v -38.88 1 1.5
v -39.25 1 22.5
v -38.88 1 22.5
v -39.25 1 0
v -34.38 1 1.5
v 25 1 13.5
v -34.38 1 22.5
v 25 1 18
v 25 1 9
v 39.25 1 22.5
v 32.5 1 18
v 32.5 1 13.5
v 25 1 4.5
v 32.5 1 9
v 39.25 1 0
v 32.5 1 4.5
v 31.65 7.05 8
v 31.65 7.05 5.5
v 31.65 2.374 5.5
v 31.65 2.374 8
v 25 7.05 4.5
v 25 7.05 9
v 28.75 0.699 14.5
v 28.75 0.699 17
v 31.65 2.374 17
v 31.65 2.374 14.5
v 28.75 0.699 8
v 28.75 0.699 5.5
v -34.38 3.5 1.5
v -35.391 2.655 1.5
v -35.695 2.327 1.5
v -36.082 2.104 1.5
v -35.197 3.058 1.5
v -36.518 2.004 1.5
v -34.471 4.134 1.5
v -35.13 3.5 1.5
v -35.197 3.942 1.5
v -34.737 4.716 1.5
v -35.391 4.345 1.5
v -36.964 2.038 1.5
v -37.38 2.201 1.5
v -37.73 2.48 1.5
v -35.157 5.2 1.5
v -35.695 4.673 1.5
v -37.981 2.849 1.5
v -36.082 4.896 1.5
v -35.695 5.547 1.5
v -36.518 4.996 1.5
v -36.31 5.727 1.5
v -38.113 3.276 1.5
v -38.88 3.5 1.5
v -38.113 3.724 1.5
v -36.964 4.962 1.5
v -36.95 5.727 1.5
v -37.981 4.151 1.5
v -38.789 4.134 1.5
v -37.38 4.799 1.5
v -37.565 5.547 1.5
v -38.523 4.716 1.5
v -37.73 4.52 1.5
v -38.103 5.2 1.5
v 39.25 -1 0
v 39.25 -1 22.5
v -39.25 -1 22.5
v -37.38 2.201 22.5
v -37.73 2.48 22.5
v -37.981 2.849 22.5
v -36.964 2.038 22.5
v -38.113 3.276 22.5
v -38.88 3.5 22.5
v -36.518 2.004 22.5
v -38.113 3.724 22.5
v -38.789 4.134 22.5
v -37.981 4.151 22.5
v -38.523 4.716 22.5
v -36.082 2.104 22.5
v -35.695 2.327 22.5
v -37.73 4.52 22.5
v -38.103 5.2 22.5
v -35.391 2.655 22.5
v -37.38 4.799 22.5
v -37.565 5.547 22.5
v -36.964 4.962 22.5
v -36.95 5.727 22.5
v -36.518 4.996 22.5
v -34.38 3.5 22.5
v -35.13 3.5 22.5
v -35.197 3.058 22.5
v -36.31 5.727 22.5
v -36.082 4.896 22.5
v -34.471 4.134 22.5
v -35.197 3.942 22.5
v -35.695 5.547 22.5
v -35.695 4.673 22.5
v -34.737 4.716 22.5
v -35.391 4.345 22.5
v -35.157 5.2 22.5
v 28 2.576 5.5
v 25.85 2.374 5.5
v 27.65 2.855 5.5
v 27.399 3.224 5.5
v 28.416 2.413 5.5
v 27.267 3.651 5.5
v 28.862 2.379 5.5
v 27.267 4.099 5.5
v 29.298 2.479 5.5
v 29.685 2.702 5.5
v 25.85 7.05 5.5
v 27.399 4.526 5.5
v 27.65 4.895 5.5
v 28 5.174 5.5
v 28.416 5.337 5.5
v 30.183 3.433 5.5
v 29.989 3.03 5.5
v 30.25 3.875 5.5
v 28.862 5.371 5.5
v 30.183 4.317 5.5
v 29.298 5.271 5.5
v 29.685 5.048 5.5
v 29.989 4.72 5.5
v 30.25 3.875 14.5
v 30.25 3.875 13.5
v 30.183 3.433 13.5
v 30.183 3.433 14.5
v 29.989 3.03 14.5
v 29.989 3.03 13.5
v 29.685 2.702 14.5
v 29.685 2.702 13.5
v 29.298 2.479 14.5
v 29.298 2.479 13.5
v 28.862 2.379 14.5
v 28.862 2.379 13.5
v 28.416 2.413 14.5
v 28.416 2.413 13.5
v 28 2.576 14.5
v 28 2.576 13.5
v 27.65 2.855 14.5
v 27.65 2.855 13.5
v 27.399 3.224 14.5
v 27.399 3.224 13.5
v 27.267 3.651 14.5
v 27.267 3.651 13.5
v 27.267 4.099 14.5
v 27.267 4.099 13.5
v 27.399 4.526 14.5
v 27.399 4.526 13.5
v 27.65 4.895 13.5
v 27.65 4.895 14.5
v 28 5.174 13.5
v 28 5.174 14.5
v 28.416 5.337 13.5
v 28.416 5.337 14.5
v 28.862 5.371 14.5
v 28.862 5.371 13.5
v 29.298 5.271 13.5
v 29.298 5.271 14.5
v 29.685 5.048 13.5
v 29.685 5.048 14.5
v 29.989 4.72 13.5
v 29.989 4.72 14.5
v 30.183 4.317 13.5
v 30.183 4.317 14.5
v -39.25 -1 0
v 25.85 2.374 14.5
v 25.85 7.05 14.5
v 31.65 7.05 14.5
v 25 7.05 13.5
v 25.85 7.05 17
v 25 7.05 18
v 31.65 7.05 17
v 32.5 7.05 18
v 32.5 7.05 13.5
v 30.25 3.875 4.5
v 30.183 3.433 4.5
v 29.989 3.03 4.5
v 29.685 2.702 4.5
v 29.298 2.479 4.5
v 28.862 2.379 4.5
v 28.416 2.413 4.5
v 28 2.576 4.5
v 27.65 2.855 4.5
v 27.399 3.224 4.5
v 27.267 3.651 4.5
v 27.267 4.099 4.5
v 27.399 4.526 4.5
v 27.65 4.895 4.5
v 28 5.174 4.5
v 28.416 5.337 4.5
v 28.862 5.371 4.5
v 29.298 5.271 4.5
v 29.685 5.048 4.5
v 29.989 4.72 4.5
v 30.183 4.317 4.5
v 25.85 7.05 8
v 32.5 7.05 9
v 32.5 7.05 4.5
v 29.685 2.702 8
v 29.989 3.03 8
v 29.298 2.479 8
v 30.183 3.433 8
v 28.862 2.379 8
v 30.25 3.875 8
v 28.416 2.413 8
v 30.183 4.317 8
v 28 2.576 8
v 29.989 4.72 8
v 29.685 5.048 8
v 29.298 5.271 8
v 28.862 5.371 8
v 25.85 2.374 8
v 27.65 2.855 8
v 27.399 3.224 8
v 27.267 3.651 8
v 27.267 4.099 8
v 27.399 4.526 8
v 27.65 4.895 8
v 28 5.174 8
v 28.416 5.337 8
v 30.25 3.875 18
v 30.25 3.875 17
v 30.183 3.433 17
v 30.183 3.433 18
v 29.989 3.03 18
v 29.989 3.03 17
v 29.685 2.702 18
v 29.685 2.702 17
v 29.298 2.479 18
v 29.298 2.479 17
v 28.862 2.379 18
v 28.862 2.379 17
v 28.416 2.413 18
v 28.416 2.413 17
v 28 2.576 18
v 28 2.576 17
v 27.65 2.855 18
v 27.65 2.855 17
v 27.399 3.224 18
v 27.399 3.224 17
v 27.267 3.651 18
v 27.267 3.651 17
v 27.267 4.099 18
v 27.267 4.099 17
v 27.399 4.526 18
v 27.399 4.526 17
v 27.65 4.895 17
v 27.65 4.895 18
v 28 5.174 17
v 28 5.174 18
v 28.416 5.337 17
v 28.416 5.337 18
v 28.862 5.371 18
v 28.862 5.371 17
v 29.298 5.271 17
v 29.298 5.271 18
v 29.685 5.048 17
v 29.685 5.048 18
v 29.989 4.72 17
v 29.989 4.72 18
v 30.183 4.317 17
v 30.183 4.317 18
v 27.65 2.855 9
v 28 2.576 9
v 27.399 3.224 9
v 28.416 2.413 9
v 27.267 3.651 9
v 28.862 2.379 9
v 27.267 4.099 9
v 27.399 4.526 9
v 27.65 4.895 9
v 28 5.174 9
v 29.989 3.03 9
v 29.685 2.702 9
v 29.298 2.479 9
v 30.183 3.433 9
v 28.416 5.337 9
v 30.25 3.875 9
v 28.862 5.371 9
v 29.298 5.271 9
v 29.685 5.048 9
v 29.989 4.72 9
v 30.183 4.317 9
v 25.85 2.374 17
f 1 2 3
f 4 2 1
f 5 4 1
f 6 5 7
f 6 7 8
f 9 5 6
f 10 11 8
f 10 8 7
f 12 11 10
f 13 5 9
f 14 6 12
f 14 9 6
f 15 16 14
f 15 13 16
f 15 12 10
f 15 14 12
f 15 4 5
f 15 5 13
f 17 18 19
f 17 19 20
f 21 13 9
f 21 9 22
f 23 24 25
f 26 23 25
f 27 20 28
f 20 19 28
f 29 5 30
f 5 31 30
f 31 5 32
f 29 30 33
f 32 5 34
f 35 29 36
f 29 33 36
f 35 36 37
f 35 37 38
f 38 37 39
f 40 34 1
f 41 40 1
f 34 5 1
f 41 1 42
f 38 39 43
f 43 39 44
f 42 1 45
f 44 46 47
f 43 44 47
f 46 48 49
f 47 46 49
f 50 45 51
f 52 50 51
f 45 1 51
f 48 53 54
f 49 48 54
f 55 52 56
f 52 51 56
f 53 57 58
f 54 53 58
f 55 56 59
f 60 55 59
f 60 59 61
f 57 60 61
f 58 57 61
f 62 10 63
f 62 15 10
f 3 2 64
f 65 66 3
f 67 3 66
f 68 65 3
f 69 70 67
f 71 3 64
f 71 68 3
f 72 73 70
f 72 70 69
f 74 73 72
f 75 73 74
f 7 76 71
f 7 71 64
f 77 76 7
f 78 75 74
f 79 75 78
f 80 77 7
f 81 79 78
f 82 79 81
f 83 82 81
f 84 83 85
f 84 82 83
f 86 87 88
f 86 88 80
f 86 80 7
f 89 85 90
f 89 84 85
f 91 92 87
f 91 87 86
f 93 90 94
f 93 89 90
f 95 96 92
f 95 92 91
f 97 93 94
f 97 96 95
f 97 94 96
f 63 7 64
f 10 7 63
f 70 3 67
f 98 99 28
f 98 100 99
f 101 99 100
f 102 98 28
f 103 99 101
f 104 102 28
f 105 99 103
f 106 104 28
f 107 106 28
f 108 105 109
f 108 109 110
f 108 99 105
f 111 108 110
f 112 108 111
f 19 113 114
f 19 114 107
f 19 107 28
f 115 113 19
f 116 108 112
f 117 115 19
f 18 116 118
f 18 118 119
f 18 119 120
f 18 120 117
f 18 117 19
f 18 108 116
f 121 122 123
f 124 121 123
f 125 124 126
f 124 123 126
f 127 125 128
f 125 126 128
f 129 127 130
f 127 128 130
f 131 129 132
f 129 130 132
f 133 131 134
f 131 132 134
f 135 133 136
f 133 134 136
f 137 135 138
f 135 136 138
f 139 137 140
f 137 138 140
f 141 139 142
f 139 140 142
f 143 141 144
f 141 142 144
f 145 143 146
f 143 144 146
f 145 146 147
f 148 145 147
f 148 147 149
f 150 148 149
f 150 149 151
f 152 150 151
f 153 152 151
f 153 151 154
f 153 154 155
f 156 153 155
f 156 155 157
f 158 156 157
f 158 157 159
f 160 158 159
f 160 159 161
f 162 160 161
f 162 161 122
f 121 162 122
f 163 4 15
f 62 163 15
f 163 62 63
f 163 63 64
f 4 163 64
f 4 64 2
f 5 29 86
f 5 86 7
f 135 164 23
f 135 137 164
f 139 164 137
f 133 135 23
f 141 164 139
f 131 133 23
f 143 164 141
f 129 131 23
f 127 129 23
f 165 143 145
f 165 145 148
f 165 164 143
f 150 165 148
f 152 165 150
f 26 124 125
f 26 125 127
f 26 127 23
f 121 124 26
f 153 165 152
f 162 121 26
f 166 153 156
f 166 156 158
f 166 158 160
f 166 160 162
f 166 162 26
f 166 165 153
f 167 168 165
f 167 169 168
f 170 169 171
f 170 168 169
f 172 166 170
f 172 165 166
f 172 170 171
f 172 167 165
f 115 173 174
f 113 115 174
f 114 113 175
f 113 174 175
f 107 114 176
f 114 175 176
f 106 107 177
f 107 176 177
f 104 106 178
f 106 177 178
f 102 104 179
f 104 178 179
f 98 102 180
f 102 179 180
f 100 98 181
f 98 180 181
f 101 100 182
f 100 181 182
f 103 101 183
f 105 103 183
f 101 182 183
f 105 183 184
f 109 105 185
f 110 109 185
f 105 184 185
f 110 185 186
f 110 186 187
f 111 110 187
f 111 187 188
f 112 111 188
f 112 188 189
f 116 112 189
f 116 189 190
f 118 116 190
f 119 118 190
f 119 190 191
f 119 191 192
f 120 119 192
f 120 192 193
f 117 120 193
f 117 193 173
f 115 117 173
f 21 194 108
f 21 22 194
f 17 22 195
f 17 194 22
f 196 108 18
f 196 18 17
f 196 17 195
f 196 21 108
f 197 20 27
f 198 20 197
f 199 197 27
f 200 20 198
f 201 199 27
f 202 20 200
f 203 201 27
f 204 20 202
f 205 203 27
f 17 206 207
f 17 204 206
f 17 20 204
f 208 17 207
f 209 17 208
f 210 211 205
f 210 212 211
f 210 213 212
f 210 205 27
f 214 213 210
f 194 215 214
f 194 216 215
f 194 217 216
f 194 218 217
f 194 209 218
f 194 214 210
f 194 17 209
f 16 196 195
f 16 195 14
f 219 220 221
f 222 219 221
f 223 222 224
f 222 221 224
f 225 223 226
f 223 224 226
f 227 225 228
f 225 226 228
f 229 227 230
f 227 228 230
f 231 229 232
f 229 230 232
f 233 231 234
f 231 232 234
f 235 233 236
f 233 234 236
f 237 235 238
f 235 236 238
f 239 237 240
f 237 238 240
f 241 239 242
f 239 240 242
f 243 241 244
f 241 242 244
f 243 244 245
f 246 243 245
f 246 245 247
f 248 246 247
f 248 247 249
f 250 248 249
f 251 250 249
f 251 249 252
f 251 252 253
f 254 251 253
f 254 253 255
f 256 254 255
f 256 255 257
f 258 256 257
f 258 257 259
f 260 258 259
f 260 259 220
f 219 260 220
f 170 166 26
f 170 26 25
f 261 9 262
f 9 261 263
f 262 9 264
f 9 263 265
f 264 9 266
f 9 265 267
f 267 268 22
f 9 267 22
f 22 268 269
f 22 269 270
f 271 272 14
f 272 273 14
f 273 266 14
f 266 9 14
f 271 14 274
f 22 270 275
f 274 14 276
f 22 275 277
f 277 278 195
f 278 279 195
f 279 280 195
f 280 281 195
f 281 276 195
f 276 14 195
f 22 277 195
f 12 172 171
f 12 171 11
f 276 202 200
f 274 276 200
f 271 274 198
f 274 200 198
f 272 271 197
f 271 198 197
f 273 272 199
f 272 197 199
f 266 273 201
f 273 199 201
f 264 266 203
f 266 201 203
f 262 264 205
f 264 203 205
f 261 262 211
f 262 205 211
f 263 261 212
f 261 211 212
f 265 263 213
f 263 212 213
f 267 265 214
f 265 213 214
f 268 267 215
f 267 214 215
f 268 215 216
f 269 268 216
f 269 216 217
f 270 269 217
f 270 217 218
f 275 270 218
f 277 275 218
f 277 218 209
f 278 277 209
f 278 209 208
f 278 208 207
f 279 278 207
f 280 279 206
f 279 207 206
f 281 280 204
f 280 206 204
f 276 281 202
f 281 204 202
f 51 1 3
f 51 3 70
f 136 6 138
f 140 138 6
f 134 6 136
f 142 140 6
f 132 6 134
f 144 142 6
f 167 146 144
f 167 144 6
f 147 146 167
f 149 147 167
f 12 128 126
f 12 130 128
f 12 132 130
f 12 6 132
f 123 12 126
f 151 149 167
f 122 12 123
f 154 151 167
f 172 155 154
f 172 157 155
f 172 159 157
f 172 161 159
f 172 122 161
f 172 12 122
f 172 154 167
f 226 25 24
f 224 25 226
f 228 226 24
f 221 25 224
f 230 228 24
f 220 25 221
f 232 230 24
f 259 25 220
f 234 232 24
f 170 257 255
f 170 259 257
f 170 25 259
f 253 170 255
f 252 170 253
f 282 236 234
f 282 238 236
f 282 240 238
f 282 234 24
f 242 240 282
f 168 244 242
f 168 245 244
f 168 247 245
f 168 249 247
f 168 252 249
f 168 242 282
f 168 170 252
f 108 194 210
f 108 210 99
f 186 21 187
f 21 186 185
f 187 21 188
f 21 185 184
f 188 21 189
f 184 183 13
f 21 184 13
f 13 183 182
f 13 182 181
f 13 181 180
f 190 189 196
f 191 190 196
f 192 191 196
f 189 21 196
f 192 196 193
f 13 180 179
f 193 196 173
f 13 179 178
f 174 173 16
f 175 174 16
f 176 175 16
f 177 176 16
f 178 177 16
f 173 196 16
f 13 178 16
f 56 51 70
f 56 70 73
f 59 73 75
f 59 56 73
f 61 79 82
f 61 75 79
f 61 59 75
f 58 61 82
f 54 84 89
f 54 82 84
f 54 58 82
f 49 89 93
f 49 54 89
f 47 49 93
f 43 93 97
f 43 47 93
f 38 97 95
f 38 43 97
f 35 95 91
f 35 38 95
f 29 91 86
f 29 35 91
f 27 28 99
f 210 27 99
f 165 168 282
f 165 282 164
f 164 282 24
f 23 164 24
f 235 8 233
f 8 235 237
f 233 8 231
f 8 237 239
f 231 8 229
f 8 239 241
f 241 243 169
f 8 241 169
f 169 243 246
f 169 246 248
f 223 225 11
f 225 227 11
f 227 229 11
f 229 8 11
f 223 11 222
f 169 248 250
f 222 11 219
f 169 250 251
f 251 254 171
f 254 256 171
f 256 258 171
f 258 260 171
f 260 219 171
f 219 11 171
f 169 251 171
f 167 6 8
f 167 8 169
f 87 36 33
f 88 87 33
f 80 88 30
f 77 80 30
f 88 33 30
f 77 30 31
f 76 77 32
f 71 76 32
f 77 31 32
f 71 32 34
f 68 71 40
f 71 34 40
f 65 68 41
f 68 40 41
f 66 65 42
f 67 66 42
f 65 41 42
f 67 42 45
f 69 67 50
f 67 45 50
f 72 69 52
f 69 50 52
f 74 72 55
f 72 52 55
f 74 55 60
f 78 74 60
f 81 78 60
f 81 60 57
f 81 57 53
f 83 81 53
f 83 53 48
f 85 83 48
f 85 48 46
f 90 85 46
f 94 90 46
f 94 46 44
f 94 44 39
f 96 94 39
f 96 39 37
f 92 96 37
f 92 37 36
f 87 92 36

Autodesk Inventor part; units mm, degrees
ref_plane "YZ Plane" through (0, 0, 0) normal (1, 0, 0) x (0, 1, 0)
ref_plane "XZ Plane" through (0, 0, 0) normal (0, 1, 0) x (-1, 0, 0)
sketch "Sketch1" plane through (0, 0, 0) normal (0, 0, 1) x (1, 0, 0)
  line L0 (-39.25, 1) -> (39.25, 1)
  line L1 (39.25, 1) -> (39.25, -1)
  line L2 (39.25, -1) -> (-39.25, -1)
  line L3 (-39.25, -1) -> (-39.25, 1)
  circle A0 centre (-36.63, 3.5) radius 1.5
  circle A1 centre (28.75, 3.875) radius 1.5
  line L4 (39.25, 6.75) -> (38, 6.75)
  line L5 (38, 6.75) -> (38, 26.75)
  line L6 (38, 26.75) -> (-38, 26.75)
  line L7 (-38, 26.75) -> (-38, 6.75)
  line L8 (-38, 6.75) -> (-39.25, 6.75)
  line L9 (-39.25, 6.75) -> (-39.25, 1)
  line L10 (-39.25, 1) -> (39.25, 1)
  line L11 (39.25, 6.75) -> (39.25, 1)
  line L12 (-34.38, 1) -> (-38.88, 1)
  line L13 (-38.88, 1) -> (-38.88, 3.5)
  line L14 (-38.88, 3.5) -> (-34.38, 3.5)
  line L15 (-34.38, 3.5) -> (-34.38, 1)
  arc A2 (-34.38, 3.5) -> (-38.88, 3.5) centre (-36.63, 3.5) ccw
  line L16 (31, 1) -> (26.5, 1)
  line L17 (26.5, 1) -> (26.5, 3.875)
  line L18 (26.5, 3.875) -> (31, 3.875)
  line L19 (31, 3.875) -> (31, 1)
  arc A3 (31, 3.875) -> (26.5, 3.875) centre (28.75, 3.875) ccw
  line L20 (31.5, 5.4627) -> (31.5, 2.2873)
  line L21 (31.5, 2.2873) -> (28.75, 0.6996)
  line L22 (28.75, 0.6996) -> (26, 2.2873)
  line L23 (26, 2.2873) -> (26, 5.4627)
  line L24 (26, 5.4627) -> (28.75, 7.0504)
  line L25 (28.75, 7.0504) -> (31.5, 5.4627)
  line L26 (32.5, 1) -> (25, 1)
  line L27 (25, 1) -> (25, 7.0504)
  line L28 (25, 7.0504) -> (32.5, 7.0504)
  line L29 (32.5, 7.0504) -> (32.5, 1)
  point P0 (0, 0)
  point P1 (0, 1)
  point P2 (39.25, 0)
  point P3 (0, 35)
  point P4 (28.75, 7.0504)
  dimension "d0" = 2
  dimension "d1" = 78.5
  dimension "d4" = 2.62
  dimension "d5" = 2.5
  dimension "d6" = 3
  dimension "d7" = 4.5
  dimension "d8" = 2.875
  dimension "d9" = 10.5
  dimension "d10" = 3
  dimension "d11" = 4.5
  dimension "d12" = 5.5
  dimension "d13" = 7.5
  dimension "d14" = 0
extrude "Extrusion1" add sketch "Sketch1" along normal blind 22.5 contours L0 L22 L21 L1 L2 L3 | L13 L14 A0 L15 L0 | A2 L14 A0 | L27 L28 L24 L23 L22 L17 L0 | L17 L22 L0 | L0 L19 L21 L20 L25 L28 L29 | L22 L17 L18 A1 L19 L21 L0 | L0 L21 L22 | L22 L23 L24 L25 L20 L21 L19 A3 L17 | L0 L21 L19 | A3 L18 A1
sketch "Sketch2" plane through (39.25, -1, 0) normal (1, 0, 0) x (0, 0, -1)
  line L0 (-22.5, 0) -> (-22.5, 2) projected
  line L1 (0, 8.0504) -> (-22.5, 8.0504) projected
  line L2 (-22.5, 2) -> (-18, 2)
  line L3 (-18, 2) -> (-18, 8.0504)
  line L4 (-18, 8.0504) -> (-22.5, 8.0504)
  line L5 (-22.5, 8.0504) -> (-22.5, 2)
  line L6 (-18, 2) -> (-13.5, 2)
  line L7 (-13.5, 2) -> (-13.5, 8.0504)
  line L8 (-13.5, 8.0504) -> (-18, 8.0504)
  line L9 (-18, 8.0504) -> (-18, 2)
  line L10 (0, 2) -> (-22.5, 2) projected
  line L11 (-4.5, 2) -> (-9, 2)
  line L12 (-9, 2) -> (-9, 8.0504)
  line L13 (-9, 8.0504) -> (-4.5, 8.0504)
  line L14 (-4.5, 8.0504) -> (-4.5, 2)
  line L15 (0, 2) -> (-4.5, 2)
  line L16 (-4.5, 2) -> (-4.5, 8.0504)
  line L17 (-4.5, 8.0504) -> (0, 8.0504)
  line L18 (0, 8.0504) -> (0, 2)
  line L19 (-9, 8.0504) -> (-13.5, 8.0504)
  line L20 (-13.5, 8.0504) -> (-13.5, 2)
  line L21 (-13.5, 2) -> (-9, 2)
  line L22 (-9, 2) -> (-9, 8.0504)
  point P0 (0, 1)
  dimension "d15" = 4.5
  dimension "d16" = 4.5
  dimension "d17" = 4.5
  dimension "d18" = 4.5
extrude "Extrusion2" cut sketch "Sketch2" against normal up to surface (14.25 mm away) contours L18 L10 L14 L1 | L12 L10 L7 L1 | L3 L2 L5 L1
sketch "Sketch3" plane through (25, 7.0504, 18) normal (0, 1, 0) x (1, 0, 0)
  line L0 (6.65, 1) -> (0.85, 1)
  line L1 (0.85, 1) -> (0.85, 3.5)
  line L2 (0.85, 3.5) -> (6.65, 3.5)
  line L3 (6.65, 3.5) -> (6.65, 1)
  line L4 (0, 0) -> (7.5, 0) projected
  line L5 (7.5, 4.5) -> (7.5, 0) projected
  line L6 (6.65, 10) -> (0.85, 10)
  line L7 (0.85, 10) -> (0.85, 12.5)
  line L8 (0.85, 12.5) -> (6.65, 12.5)
  line L9 (6.65, 12.5) -> (6.65, 10)
  line L10 (0, 9) -> (7.5, 9) projected
  line L11 (7.5, 13.5) -> (7.5, 9) projected
  point P0 (-25, 18)
  point P1 (3.75, 1)
  point P2 (3.75, 0)
  point P3 (6.65, 2.25)
  point P4 (7.5, 2.25)
  point P5 (3.75, 10)
  point P6 (3.75, 9)
  point P7 (6.65, 11.25)
  point P8 (7.5, 11.25)
  dimension "d21" = 5.8
  dimension "d22" = 2.5
  dimension "d23" = 5.8
  dimension "d24" = 2.5
extrude "Extrusion3" cut sketch "Sketch3" against normal blind 6.351
sketch "Sketch4" plane through (25.85, 7.0504, 5.5) normal (0, 0, 1) x (1, 0, 0)
  circle A0 centre (2.9, -3.1754) radius 1.5 projected
  line L0 (0, 0) -> (5.8, 0) projected
  line L1 (0, 0) -> (0, -6.351) projected
  line L2 (0, -6.351) -> (5.8, -6.351) projected
  line L3 (5.8, 0) -> (5.8, -6.351) projected
  line L4 (2.9, -6.351) -> (0, -4.6767)
  line L5 (0.1499, -4.7632) -> (0.1499, -1.5876)
  line L6 (0.1499, -1.5876) -> (2.9, 0.0001)
  line L7 (2.9, 0.0001) -> (5.6501, -1.5876)
  line L8 (5.6501, -1.5876) -> (5.6501, -4.7632)
  line L9 (5.8, -4.6767) -> (2.9, -6.351)
  point P0 (-25.85, -7.0504)
extrude "Extrusion4" add sketch "Sketch4" along normal up to surface (2.5 mm away) contours L4 L2 L1 | L3 L2 L9
ref_plane "Work Plane1" through (25, 7.0504, 11.25) normal (0, 0, 1) x (1, 0, 0)
mirror "Mirror1" about plane through (25, 7.0504, 11.25) normal (0, 0, 1) of "Extrusion4"
sketch "Sketch5" plane through (-39.25, -1, 0) normal (0, -1, 0) x (1, 0, 0)
  line L0 (6.1251, 17.7549) -> (72.3749, 17.7549) construction
  line L1 (72.3749, 17.7549) -> (72.3749, 4.7451) construction
  line L2 (72.3749, 4.7451) -> (6.1251, 4.7451) construction
  line L3 (6.1251, 4.7451) -> (6.1251, 17.7549) construction
  line L4 (0, 22.5) -> (78.5, 22.5) projected
  line L5 (78.5, 0) -> (78.5, 22.5) projected
  point P0 (39.25, 0)
  point P1 (39.25, 17.7549)
  point P2 (39.25, 22.5)
  point P3 (72.3749, 11.25)
  point P4 (78.5, 11.25)
sketch "Sketch6" plane through (-39.25, -1, 0) normal (-1, 0, 0) x (0, 0, 1)
  line L0 (0, 0) -> (0, 2) projected
  line L1 (0, 6.75) -> (22.5, 6.75) projected
  line L2 (0, 2) -> (1.5, 2)
  line L3 (1.5, 2) -> (1.5, 6.75)
  line L4 (1.5, 6.75) -> (0, 6.75)
  line L5 (0, 6.75) -> (0, 2)
  point P0 (0, 1)
  dimension "d30" = 1.5
extrude "Extrusion5" cut sketch "Sketch6" against normal blind 10
equation "\"d11\" = d7"
equation "\"d17\" = d15"
equation "\"d18\" = d16"
equation "\"d23\" = d21"
equation "\"d24\" = d22"
properties part number "vrata"
